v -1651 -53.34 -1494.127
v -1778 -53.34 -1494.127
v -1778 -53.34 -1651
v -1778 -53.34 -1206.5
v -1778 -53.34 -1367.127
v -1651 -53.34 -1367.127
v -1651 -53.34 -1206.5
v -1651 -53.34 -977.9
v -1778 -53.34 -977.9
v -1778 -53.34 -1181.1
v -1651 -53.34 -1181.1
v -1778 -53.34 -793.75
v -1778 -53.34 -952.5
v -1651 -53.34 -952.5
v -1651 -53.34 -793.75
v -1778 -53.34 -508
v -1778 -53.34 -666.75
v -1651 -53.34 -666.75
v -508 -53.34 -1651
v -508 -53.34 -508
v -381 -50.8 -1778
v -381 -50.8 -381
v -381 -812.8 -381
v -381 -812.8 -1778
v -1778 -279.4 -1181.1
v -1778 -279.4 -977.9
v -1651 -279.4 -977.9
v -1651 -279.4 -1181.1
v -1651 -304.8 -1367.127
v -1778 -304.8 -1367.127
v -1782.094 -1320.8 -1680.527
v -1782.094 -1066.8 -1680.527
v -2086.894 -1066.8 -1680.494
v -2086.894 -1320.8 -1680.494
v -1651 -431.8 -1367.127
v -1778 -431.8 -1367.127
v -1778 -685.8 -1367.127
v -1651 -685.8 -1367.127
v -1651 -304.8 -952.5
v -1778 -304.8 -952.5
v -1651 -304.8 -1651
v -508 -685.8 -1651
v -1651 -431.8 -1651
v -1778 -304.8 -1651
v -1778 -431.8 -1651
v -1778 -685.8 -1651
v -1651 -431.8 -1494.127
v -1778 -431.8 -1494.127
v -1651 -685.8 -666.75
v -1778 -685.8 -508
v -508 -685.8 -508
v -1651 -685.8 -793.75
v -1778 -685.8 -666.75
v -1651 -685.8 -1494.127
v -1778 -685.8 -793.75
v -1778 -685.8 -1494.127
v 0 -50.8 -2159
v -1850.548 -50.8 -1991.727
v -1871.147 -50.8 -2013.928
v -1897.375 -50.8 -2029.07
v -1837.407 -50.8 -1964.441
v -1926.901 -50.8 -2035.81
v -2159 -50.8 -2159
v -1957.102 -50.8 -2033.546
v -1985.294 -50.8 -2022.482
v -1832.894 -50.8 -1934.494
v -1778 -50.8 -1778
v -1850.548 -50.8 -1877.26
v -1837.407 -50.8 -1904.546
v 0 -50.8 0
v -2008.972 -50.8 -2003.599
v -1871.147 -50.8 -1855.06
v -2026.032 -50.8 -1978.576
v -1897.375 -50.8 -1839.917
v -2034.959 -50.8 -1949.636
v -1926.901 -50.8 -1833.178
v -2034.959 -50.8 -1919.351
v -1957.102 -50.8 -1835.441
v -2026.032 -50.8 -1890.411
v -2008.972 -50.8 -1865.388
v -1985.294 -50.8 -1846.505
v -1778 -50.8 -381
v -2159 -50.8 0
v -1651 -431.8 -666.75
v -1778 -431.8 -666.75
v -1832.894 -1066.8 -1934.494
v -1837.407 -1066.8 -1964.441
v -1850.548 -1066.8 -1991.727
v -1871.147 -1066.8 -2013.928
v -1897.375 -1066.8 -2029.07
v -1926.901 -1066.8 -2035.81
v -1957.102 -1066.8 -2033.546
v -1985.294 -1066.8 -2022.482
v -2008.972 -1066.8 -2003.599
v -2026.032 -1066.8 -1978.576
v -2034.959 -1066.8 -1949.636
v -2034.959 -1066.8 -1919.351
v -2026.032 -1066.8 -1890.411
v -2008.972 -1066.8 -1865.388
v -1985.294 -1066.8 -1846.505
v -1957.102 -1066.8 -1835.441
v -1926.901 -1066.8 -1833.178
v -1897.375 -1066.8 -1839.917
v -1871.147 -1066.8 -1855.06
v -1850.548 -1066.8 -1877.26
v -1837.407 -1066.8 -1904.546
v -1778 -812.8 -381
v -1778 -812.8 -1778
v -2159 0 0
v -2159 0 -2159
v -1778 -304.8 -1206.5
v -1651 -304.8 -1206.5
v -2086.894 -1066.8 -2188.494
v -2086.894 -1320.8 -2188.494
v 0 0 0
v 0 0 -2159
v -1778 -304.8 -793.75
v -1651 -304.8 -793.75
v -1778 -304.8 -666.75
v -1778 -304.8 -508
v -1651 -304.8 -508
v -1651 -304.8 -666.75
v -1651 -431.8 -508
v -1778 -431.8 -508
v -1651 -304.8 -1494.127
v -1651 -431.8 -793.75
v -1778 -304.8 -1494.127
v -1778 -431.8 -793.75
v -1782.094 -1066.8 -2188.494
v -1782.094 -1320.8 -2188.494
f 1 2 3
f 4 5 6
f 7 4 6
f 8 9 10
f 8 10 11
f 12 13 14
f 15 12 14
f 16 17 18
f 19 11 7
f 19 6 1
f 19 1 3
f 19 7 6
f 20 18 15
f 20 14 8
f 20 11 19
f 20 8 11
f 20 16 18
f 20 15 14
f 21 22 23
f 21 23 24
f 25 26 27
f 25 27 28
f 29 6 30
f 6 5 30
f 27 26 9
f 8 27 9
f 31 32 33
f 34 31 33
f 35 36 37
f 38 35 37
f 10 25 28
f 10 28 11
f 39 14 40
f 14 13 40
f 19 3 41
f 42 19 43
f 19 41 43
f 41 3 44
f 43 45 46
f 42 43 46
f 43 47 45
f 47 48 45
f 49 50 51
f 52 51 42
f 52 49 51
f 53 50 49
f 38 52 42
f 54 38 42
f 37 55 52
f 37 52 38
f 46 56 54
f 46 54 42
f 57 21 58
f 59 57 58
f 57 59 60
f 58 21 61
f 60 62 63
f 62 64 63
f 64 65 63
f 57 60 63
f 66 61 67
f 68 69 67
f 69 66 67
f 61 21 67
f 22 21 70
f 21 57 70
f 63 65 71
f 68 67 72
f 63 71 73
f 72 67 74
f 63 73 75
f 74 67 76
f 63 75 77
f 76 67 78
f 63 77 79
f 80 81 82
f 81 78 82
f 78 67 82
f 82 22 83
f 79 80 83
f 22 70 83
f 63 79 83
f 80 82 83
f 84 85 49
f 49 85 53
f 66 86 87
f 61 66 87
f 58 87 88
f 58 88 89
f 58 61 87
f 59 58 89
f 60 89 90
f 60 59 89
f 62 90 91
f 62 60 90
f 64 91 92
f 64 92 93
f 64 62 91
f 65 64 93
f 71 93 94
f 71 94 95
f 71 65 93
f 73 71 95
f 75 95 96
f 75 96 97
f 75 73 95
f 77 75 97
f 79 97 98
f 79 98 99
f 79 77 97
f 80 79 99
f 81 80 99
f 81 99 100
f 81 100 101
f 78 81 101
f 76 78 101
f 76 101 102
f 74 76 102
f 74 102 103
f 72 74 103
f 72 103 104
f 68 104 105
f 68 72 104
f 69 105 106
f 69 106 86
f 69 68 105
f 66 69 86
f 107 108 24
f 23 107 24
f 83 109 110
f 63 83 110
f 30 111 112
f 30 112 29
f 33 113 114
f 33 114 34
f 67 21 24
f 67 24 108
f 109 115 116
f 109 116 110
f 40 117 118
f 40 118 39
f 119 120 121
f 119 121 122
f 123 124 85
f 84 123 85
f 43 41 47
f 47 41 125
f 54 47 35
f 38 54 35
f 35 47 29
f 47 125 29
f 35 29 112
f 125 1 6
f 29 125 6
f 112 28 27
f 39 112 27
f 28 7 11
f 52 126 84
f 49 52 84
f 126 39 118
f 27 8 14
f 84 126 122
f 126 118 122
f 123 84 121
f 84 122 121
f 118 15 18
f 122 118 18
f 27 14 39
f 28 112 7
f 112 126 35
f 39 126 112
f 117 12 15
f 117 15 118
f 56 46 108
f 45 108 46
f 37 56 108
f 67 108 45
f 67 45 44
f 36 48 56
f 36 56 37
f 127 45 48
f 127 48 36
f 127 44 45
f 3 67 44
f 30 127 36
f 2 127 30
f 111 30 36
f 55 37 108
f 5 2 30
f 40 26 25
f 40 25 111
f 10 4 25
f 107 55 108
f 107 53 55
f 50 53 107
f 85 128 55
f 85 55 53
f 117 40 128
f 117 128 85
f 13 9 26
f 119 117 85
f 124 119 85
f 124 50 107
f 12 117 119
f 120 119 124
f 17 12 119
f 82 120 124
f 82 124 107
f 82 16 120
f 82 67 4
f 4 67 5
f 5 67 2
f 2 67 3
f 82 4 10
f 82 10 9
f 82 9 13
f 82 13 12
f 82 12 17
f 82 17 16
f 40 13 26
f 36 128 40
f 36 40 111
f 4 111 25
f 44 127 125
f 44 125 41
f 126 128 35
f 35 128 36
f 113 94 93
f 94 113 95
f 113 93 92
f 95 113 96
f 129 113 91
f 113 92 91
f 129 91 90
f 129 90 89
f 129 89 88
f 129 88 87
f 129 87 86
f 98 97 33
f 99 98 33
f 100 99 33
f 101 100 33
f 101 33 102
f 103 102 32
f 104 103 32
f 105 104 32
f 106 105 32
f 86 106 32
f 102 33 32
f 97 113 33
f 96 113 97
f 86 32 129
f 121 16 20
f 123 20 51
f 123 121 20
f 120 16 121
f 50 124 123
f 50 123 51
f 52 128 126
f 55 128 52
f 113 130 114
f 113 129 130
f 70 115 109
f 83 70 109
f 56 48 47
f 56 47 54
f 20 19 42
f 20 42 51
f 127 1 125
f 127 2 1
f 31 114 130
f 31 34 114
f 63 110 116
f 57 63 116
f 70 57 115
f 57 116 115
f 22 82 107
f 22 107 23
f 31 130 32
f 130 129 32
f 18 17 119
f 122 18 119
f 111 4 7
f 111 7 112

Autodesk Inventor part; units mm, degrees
ref_plane "YZ Plane" through (0, 0, 0) normal (1, 0, 0) x (0, 1, 0)
ref_plane "XZ Plane" through (0, 0, 0) normal (0, 1, 0) x (-1, 0, 0)
ref_plane "XY Plane" through (0, 0, 0) normal (0, 0, 1) x (1, 0, 0)
sketch "Sketch1" plane through (0, 0, 0) normal (0, 1, 0) x (-1, 0, 0)
  line L0 (0, 0) -> (2159, 0)
  line L1 (2159, 0) -> (2159, -2159)
  line L2 (2159, -2159) -> (0, -2159)
  line L3 (0, -2159) -> (0, 0)
  dimension "d0" = 2159
  dimension "d1" = 2159
  dimension "d2" = 2159
extrude "Extrusion1" add sketch "Sketch1" against normal blind 50.8
sketch "Sketch2" plane through (0, -50.8, 0) normal (0, -1, 0) x (1, 0, 0)
  line L0 (0, 0) -> (-2159, 0) projected
  line L1 (0, 0) -> (0, -381)
  line L2 (0, -2159) -> (0, 0) projected
  line L3 (-381, -381) -> (-381, -1778)
  line L4 (-381, -1778) -> (-1778, -1778)
  line L5 (-1778, -1778) -> (-1778, -381)
  line L6 (-1778, -381) -> (-381, -381)
  dimension "d7" = 1397
  dimension "d8" = 1397
  dimension "d9" = 1397
extrude "Extrusion2" add sketch "Sketch2" along normal blind 762
sketch "Sketch3" plane through (0, -50.8, 0) normal (0, -1, 0) x (1, 0, 0)
  line L0 (-2159, -2159) -> (0, -2159) projected
  line L1 (-2159, -2159) -> (-1934.4936, -1934.4936)
  line L2 (-2159, -2159) -> (-1841.5, -2159) construction
  circle A0 centre (-1934.4936, -1934.4936) radius 101.6
  point P0 (0, 0)
  dimension "d12" = 317.5
  dimension "d13" = 45
  dimension "d14" = 203.2
extrude "Extrusion3" add sketch "Sketch3" along normal blind 1016
sketch "Sketch4" plane through (-1934.4936, -1066.8, -1934.4936) normal (0, -1, 0) x (1, 0, 0)
  line L0 (0, 0) -> (152.4, 0)
  line L1 (0, 0) -> (-152.4, 0)
  line L2 (152.4, 0) -> (152.4, -254)
  line L3 (152.4, 0) -> (152.4, 253.967)
  line L4 (156.4936, 156.4936) -> (156.4936, 1553.4936) projected
  line L5 (152.4, -254) -> (-152.4, -254)
  line L6 (-152.4, -254) -> (-152.4, 254)
  line L7 (152.4, 253.967) -> (-152.4, 254)
  point P0 (1934.4936, 1934.4936)
  dimension "d17" = 152.4
  dimension "d18" = 152.4
  dimension "d19" = 254
  dimension "d20" = 253.967
  dimension "d21" = 304.8
  dimension "d22" = 508
extrude "Extrusion4" add sketch "Sketch4" along normal blind 254
sketch "Sketch5" plane through (-2086.8936, -1066.8, -2188.4936) normal (-1, 0, 0) x (0, 0, 1)
  point P0 (2188.4936, 1066.8)
sketch "Sketch6" plane through (-1778, -50.8, -1778) normal (-1, 0, 0) x (0, 0, 1)
  line L0 (0, 0) -> (127, 0)
  line L1 (0, 0) -> (1397, 0) projected
  line L2 (127, 0) -> (127, -762)
  line L3 (1397, 0) -> (1270, 0)
  line L4 (1270, 0) -> (1270, -762)
  line L5 (1270, -762) -> (1270, -635)
  line L6 (1270, -635) -> (127, -635)
  point P0 (1778, 50.8)
  dimension "d25" = 127
  dimension "d26" = 127
  dimension "d27" = 127
extrude "Extrusion5" cut sketch "Sketch6" against normal blind 1270
sketch "Sketch7" plane through (-1778, -812.8, -1778) normal (-1, 0, 0) x (0, 0, 1)
  line L0 (0, 0) -> (0, 762)
  line L1 (-381, 762) -> (1778, 762) projected
  line L2 (0, 762) -> (698.5, 762)
  line L3 (698.5, 762) -> (698.5, 135.629)
  line L4 (698.5, 762) -> (825.5, 762)
  line L5 (1778, 762) -> (-381, 762) projected
  line L6 (698.5, 762) -> (571.5, 762)
  line L7 (825.5, 762) -> (825.5, 508)
  line L8 (825.5, 508) -> (571.5, 508)
  line L9 (571.5, 762) -> (571.5, 508)
  point P0 (1778, 812.8)
  dimension "d30" = 698.5
  dimension "d31" = 127
  dimension "d32" = 127
  dimension "d38" = 254
  dimension "d39" = 254
extrude "Extrusion6" add sketch "Sketch7" against normal blind 127
sketch "Sketch8" plane through (-1778, -812.8, -1778) normal (-1, 0, 0) x (0, 0, 1)
  line L0 (800.1, 533.4) -> (596.9, 533.4)
  line L1 (596.9, 533.4) -> (596.9, 762)
  line L2 (571.5, 762) -> (825.5, 762) projected
  line L3 (800.1, 533.4) -> (800.1, 762)
  point P0 (1778, 812.8)
  point P1 (825.5, 508)
extrude "Extrusion7" cut sketch "Sketch8" against normal blind 127
sketch "Sketch9" plane through (-1778, -812.8, -1778) normal (-1, 0, 0) x (0, 0, 1)
  line L0 (1047.75, 762) -> (1047.75, 127)
  line L1 (1270, 127) -> (127, 127) projected
  line L2 (1047.75, 762) -> (1111.25, 762)
  line L3 (1047.75, 762) -> (984.25, 762)
  line L4 (1111.25, 762) -> (1111.25, 127)
  line L5 (984.25, 762) -> (984.25, 127)
  line L6 (347.3726, 762) -> (283.8726, 762)
  line L7 (347.3726, 762) -> (410.8726, 762)
  line L8 (410.8726, 762) -> (410.8726, 127)
  line L9 (283.8726, 762) -> (283.8726, 127)
  line L10 (1270, 762) -> (1270, 127) projected
  line L11 (1270, 444.5) -> (1270, 508)
  line L12 (1270, 444.5) -> (1270, 381)
  line L13 (1270, 381) -> (127, 381)
  line L14 (127, 127) -> (127, 762) projected
  line L15 (1270, 508) -> (127, 508)
  point P0 (1778, 812.8)
  point P1 (825.5, 762)
  dimension "d48" = 63.5
  dimension "d49" = 63.5
  dimension "d51" = 63.5
  dimension "d52" = 63.5
  dimension "d53" = 635
  dimension "d55" = 63.5
  dimension "d56" = 63.5
extrude "Extrusion8" add sketch "Sketch9" against normal blind 127 contours L2 L4 L15 L0 | L0 L15 L5 L3 | L15 L4 L13 L0 | L0 L13 L5 L15 | L13 L4 L1 L0 | L0 L1 L5 L13 | L15 L10 L13 L4 | L5 L13 L8 L15 | L15 L9 L6 L7 L8 | L8 L13 L9 L15 | L8 L1 L9 L13 | L9 L13 L14 L15
sketch "Sketch10" plane through (0, -50.8, 0) normal (0, -1, 0) x (1, 0, 0)
  line L0 (-1778, -508) -> (-1778, -381) projected
  line L1 (-1778, -381) -> (-1778, -1778)
  line L2 (-381, -381) -> (-381, -1778) projected
  line L3 (-1778, -1778) -> (-381, -1778)
  line L4 (-381, -381) -> (-1778, -381) projected
  line L5 (-381, -1778) -> (-381, -381)
  line L6 (-381, -381) -> (-1778, -381)
  point P0 (0, 0)
  dimension "d59" = 1397
  dimension "d60" = 1397
extrude "Extrusion9" add sketch "Sketch10" along normal blind 2.54
properties part number "PartStoreipt"
